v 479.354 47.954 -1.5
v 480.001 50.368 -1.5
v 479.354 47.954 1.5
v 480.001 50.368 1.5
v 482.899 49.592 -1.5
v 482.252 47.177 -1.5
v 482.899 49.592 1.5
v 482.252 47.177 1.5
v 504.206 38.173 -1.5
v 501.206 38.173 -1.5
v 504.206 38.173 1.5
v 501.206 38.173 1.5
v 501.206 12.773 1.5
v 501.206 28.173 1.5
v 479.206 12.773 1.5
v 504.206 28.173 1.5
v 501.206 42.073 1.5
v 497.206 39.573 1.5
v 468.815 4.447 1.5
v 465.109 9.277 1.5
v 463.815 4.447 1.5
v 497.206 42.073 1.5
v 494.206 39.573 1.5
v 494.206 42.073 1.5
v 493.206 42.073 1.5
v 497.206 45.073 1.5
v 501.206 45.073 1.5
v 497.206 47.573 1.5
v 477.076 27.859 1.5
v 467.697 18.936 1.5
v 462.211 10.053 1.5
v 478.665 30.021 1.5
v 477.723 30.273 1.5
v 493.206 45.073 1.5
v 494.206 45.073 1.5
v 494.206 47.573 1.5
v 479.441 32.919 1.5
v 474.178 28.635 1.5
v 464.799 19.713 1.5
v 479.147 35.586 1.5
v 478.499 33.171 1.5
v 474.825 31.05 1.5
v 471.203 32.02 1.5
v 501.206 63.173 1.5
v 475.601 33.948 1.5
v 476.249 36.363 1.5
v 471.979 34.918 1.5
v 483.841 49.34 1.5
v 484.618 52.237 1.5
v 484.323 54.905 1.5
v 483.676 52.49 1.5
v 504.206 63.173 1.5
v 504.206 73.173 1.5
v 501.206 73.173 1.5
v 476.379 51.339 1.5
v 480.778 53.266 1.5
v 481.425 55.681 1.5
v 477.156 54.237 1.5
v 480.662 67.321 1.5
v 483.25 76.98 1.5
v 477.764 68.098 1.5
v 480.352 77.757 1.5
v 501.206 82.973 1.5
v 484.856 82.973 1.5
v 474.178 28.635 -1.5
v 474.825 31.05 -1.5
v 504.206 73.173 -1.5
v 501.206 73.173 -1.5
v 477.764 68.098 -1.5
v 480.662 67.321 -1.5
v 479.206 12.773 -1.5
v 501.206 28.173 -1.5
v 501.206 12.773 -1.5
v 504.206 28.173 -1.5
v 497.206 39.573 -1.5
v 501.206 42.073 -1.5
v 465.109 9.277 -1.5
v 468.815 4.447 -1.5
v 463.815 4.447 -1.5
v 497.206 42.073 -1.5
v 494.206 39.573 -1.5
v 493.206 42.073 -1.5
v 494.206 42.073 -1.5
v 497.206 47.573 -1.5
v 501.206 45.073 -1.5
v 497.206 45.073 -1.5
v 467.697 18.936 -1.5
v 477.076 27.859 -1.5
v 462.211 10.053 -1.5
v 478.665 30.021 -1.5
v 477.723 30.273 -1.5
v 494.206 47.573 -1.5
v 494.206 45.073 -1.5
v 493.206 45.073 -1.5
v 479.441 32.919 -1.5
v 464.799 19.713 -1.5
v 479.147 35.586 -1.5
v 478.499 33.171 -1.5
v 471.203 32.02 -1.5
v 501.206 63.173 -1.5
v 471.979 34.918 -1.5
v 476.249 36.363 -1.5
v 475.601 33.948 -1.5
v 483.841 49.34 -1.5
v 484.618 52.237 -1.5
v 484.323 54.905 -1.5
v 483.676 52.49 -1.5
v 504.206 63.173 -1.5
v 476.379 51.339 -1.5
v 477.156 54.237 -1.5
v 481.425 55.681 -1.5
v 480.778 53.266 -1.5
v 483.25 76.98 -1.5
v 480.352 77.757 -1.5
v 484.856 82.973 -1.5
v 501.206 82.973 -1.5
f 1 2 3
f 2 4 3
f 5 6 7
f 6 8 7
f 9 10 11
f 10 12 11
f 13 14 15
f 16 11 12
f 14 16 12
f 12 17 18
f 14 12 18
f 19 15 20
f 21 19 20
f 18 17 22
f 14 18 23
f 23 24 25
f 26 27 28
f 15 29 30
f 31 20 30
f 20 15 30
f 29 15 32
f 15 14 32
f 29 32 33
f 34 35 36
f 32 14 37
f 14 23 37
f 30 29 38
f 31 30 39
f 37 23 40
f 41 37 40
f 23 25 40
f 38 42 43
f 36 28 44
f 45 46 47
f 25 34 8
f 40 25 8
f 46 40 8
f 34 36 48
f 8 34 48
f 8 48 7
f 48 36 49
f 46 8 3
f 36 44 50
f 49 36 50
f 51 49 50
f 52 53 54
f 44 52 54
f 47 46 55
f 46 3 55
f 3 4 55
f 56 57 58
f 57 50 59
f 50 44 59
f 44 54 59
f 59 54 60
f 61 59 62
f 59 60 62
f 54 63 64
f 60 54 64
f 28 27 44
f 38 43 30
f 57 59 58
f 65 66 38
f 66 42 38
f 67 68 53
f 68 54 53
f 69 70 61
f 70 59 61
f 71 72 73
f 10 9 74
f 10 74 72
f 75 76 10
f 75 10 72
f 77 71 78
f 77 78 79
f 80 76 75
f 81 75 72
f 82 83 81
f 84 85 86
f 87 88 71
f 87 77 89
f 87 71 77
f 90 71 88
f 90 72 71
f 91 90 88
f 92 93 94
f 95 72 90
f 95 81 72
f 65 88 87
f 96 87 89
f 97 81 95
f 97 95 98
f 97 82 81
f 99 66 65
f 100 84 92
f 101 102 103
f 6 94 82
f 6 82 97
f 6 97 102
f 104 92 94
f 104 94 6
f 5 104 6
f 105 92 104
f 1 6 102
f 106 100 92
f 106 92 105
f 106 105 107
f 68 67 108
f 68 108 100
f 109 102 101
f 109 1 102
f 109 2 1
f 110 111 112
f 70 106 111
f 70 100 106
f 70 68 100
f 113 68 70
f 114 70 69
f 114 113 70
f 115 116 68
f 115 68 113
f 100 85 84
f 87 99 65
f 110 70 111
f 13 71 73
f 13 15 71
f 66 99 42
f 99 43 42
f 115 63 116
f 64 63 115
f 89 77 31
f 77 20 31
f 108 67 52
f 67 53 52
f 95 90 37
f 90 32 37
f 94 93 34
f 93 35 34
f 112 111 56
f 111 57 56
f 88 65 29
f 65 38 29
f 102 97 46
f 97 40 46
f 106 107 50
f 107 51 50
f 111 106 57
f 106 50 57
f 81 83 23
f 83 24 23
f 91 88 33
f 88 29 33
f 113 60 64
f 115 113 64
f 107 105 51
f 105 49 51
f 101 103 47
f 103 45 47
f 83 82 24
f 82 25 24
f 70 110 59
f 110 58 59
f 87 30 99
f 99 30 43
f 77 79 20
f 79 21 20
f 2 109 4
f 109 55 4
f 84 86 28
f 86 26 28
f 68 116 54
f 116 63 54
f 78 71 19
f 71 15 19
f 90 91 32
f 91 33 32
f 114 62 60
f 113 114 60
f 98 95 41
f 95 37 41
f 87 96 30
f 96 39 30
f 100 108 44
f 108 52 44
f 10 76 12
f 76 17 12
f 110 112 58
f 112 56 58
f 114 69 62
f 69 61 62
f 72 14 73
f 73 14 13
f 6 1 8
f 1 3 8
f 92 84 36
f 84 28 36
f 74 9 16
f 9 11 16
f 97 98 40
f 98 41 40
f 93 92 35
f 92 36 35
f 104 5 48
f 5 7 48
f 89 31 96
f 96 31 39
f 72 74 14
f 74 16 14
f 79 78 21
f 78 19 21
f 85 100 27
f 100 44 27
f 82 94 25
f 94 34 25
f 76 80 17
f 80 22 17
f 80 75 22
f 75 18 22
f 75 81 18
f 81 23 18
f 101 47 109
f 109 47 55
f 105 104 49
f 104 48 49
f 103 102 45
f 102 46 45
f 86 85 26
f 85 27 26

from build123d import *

# Parameters (mm, degrees)
SALIENTE_EXTRUIR1_DEPTH = 1.5


with BuildPart() as part:
    # Croquis1 → Saliente-Extruir1 (new, symmetric)
    with BuildSketch(Plane.XY):
        Polygon((484.855720511, 82.973038085), (491.215178715, 82.973038085), (501.205555648, 82.973038085), (501.205555648, 73.173108985), (504.205555648, 73.173108985), (504.205555648, 63.173108985), (501.205555648, 63.173108985), (501.205555648, 45.073108985), (497.205555648, 45.073108985), (497.205555648, 47.573108985), (494.205555648, 47.573108985), (494.205555648, 45.073108985), (493.205555648, 45.073108985), (493.205555648, 42.073108985), (494.205555648, 42.073108985), (494.205555648, 39.573108985), (497.205555648, 39.573108985), (497.205555648, 42.073108985), (501.205555648, 42.073108985), (501.205555648, 38.173108985), (504.205555648, 38.173108985), (504.205555648, 28.173108985), (501.205555648, 28.173108985), (501.205555648, 12.773108985), (494.855720505, 12.773108985), (479.205555648, 12.773108985), (468.814796849, 4.447241951), (463.814796852, 4.447241951), (465.108892077, 9.276871079), (462.2111146, 10.053328214), (464.799305049, 19.712586471), (467.697082526, 18.936129336), (471.203015891, 32.02045078), (474.824900651, 31.049969683), (474.177853039, 28.635155119), (477.075967602, 27.858607662), (477.723015214, 30.273422227), (478.664792894, 30.021073658), (479.441250029, 32.918851135), (478.499472349, 33.171199704), (479.146628347, 35.586418771), (476.248513785, 36.362966228), (475.601357786, 33.94774716), (471.979473025, 34.918228257), (476.379396799, 51.33896733), (480.001281419, 50.368486271), (479.354233806, 47.953671707), (482.252348369, 47.177124251), (482.899395981, 49.591938815), (483.841173662, 49.339590246), (484.617630796, 52.237367723), (483.675853116, 52.489716292), (484.323009115, 54.904935359), (481.424894552, 55.681482816), (480.777738553, 53.266263749), (477.155853934, 54.236744807), (480.661787289, 67.321066215), (477.764009811, 68.097523349), (480.352200261, 77.756781606), (483.249977738, 76.980324471), align=None)
    extrude(amount=SALIENTE_EXTRUIR1_DEPTH, both=True)


solid = part.part
